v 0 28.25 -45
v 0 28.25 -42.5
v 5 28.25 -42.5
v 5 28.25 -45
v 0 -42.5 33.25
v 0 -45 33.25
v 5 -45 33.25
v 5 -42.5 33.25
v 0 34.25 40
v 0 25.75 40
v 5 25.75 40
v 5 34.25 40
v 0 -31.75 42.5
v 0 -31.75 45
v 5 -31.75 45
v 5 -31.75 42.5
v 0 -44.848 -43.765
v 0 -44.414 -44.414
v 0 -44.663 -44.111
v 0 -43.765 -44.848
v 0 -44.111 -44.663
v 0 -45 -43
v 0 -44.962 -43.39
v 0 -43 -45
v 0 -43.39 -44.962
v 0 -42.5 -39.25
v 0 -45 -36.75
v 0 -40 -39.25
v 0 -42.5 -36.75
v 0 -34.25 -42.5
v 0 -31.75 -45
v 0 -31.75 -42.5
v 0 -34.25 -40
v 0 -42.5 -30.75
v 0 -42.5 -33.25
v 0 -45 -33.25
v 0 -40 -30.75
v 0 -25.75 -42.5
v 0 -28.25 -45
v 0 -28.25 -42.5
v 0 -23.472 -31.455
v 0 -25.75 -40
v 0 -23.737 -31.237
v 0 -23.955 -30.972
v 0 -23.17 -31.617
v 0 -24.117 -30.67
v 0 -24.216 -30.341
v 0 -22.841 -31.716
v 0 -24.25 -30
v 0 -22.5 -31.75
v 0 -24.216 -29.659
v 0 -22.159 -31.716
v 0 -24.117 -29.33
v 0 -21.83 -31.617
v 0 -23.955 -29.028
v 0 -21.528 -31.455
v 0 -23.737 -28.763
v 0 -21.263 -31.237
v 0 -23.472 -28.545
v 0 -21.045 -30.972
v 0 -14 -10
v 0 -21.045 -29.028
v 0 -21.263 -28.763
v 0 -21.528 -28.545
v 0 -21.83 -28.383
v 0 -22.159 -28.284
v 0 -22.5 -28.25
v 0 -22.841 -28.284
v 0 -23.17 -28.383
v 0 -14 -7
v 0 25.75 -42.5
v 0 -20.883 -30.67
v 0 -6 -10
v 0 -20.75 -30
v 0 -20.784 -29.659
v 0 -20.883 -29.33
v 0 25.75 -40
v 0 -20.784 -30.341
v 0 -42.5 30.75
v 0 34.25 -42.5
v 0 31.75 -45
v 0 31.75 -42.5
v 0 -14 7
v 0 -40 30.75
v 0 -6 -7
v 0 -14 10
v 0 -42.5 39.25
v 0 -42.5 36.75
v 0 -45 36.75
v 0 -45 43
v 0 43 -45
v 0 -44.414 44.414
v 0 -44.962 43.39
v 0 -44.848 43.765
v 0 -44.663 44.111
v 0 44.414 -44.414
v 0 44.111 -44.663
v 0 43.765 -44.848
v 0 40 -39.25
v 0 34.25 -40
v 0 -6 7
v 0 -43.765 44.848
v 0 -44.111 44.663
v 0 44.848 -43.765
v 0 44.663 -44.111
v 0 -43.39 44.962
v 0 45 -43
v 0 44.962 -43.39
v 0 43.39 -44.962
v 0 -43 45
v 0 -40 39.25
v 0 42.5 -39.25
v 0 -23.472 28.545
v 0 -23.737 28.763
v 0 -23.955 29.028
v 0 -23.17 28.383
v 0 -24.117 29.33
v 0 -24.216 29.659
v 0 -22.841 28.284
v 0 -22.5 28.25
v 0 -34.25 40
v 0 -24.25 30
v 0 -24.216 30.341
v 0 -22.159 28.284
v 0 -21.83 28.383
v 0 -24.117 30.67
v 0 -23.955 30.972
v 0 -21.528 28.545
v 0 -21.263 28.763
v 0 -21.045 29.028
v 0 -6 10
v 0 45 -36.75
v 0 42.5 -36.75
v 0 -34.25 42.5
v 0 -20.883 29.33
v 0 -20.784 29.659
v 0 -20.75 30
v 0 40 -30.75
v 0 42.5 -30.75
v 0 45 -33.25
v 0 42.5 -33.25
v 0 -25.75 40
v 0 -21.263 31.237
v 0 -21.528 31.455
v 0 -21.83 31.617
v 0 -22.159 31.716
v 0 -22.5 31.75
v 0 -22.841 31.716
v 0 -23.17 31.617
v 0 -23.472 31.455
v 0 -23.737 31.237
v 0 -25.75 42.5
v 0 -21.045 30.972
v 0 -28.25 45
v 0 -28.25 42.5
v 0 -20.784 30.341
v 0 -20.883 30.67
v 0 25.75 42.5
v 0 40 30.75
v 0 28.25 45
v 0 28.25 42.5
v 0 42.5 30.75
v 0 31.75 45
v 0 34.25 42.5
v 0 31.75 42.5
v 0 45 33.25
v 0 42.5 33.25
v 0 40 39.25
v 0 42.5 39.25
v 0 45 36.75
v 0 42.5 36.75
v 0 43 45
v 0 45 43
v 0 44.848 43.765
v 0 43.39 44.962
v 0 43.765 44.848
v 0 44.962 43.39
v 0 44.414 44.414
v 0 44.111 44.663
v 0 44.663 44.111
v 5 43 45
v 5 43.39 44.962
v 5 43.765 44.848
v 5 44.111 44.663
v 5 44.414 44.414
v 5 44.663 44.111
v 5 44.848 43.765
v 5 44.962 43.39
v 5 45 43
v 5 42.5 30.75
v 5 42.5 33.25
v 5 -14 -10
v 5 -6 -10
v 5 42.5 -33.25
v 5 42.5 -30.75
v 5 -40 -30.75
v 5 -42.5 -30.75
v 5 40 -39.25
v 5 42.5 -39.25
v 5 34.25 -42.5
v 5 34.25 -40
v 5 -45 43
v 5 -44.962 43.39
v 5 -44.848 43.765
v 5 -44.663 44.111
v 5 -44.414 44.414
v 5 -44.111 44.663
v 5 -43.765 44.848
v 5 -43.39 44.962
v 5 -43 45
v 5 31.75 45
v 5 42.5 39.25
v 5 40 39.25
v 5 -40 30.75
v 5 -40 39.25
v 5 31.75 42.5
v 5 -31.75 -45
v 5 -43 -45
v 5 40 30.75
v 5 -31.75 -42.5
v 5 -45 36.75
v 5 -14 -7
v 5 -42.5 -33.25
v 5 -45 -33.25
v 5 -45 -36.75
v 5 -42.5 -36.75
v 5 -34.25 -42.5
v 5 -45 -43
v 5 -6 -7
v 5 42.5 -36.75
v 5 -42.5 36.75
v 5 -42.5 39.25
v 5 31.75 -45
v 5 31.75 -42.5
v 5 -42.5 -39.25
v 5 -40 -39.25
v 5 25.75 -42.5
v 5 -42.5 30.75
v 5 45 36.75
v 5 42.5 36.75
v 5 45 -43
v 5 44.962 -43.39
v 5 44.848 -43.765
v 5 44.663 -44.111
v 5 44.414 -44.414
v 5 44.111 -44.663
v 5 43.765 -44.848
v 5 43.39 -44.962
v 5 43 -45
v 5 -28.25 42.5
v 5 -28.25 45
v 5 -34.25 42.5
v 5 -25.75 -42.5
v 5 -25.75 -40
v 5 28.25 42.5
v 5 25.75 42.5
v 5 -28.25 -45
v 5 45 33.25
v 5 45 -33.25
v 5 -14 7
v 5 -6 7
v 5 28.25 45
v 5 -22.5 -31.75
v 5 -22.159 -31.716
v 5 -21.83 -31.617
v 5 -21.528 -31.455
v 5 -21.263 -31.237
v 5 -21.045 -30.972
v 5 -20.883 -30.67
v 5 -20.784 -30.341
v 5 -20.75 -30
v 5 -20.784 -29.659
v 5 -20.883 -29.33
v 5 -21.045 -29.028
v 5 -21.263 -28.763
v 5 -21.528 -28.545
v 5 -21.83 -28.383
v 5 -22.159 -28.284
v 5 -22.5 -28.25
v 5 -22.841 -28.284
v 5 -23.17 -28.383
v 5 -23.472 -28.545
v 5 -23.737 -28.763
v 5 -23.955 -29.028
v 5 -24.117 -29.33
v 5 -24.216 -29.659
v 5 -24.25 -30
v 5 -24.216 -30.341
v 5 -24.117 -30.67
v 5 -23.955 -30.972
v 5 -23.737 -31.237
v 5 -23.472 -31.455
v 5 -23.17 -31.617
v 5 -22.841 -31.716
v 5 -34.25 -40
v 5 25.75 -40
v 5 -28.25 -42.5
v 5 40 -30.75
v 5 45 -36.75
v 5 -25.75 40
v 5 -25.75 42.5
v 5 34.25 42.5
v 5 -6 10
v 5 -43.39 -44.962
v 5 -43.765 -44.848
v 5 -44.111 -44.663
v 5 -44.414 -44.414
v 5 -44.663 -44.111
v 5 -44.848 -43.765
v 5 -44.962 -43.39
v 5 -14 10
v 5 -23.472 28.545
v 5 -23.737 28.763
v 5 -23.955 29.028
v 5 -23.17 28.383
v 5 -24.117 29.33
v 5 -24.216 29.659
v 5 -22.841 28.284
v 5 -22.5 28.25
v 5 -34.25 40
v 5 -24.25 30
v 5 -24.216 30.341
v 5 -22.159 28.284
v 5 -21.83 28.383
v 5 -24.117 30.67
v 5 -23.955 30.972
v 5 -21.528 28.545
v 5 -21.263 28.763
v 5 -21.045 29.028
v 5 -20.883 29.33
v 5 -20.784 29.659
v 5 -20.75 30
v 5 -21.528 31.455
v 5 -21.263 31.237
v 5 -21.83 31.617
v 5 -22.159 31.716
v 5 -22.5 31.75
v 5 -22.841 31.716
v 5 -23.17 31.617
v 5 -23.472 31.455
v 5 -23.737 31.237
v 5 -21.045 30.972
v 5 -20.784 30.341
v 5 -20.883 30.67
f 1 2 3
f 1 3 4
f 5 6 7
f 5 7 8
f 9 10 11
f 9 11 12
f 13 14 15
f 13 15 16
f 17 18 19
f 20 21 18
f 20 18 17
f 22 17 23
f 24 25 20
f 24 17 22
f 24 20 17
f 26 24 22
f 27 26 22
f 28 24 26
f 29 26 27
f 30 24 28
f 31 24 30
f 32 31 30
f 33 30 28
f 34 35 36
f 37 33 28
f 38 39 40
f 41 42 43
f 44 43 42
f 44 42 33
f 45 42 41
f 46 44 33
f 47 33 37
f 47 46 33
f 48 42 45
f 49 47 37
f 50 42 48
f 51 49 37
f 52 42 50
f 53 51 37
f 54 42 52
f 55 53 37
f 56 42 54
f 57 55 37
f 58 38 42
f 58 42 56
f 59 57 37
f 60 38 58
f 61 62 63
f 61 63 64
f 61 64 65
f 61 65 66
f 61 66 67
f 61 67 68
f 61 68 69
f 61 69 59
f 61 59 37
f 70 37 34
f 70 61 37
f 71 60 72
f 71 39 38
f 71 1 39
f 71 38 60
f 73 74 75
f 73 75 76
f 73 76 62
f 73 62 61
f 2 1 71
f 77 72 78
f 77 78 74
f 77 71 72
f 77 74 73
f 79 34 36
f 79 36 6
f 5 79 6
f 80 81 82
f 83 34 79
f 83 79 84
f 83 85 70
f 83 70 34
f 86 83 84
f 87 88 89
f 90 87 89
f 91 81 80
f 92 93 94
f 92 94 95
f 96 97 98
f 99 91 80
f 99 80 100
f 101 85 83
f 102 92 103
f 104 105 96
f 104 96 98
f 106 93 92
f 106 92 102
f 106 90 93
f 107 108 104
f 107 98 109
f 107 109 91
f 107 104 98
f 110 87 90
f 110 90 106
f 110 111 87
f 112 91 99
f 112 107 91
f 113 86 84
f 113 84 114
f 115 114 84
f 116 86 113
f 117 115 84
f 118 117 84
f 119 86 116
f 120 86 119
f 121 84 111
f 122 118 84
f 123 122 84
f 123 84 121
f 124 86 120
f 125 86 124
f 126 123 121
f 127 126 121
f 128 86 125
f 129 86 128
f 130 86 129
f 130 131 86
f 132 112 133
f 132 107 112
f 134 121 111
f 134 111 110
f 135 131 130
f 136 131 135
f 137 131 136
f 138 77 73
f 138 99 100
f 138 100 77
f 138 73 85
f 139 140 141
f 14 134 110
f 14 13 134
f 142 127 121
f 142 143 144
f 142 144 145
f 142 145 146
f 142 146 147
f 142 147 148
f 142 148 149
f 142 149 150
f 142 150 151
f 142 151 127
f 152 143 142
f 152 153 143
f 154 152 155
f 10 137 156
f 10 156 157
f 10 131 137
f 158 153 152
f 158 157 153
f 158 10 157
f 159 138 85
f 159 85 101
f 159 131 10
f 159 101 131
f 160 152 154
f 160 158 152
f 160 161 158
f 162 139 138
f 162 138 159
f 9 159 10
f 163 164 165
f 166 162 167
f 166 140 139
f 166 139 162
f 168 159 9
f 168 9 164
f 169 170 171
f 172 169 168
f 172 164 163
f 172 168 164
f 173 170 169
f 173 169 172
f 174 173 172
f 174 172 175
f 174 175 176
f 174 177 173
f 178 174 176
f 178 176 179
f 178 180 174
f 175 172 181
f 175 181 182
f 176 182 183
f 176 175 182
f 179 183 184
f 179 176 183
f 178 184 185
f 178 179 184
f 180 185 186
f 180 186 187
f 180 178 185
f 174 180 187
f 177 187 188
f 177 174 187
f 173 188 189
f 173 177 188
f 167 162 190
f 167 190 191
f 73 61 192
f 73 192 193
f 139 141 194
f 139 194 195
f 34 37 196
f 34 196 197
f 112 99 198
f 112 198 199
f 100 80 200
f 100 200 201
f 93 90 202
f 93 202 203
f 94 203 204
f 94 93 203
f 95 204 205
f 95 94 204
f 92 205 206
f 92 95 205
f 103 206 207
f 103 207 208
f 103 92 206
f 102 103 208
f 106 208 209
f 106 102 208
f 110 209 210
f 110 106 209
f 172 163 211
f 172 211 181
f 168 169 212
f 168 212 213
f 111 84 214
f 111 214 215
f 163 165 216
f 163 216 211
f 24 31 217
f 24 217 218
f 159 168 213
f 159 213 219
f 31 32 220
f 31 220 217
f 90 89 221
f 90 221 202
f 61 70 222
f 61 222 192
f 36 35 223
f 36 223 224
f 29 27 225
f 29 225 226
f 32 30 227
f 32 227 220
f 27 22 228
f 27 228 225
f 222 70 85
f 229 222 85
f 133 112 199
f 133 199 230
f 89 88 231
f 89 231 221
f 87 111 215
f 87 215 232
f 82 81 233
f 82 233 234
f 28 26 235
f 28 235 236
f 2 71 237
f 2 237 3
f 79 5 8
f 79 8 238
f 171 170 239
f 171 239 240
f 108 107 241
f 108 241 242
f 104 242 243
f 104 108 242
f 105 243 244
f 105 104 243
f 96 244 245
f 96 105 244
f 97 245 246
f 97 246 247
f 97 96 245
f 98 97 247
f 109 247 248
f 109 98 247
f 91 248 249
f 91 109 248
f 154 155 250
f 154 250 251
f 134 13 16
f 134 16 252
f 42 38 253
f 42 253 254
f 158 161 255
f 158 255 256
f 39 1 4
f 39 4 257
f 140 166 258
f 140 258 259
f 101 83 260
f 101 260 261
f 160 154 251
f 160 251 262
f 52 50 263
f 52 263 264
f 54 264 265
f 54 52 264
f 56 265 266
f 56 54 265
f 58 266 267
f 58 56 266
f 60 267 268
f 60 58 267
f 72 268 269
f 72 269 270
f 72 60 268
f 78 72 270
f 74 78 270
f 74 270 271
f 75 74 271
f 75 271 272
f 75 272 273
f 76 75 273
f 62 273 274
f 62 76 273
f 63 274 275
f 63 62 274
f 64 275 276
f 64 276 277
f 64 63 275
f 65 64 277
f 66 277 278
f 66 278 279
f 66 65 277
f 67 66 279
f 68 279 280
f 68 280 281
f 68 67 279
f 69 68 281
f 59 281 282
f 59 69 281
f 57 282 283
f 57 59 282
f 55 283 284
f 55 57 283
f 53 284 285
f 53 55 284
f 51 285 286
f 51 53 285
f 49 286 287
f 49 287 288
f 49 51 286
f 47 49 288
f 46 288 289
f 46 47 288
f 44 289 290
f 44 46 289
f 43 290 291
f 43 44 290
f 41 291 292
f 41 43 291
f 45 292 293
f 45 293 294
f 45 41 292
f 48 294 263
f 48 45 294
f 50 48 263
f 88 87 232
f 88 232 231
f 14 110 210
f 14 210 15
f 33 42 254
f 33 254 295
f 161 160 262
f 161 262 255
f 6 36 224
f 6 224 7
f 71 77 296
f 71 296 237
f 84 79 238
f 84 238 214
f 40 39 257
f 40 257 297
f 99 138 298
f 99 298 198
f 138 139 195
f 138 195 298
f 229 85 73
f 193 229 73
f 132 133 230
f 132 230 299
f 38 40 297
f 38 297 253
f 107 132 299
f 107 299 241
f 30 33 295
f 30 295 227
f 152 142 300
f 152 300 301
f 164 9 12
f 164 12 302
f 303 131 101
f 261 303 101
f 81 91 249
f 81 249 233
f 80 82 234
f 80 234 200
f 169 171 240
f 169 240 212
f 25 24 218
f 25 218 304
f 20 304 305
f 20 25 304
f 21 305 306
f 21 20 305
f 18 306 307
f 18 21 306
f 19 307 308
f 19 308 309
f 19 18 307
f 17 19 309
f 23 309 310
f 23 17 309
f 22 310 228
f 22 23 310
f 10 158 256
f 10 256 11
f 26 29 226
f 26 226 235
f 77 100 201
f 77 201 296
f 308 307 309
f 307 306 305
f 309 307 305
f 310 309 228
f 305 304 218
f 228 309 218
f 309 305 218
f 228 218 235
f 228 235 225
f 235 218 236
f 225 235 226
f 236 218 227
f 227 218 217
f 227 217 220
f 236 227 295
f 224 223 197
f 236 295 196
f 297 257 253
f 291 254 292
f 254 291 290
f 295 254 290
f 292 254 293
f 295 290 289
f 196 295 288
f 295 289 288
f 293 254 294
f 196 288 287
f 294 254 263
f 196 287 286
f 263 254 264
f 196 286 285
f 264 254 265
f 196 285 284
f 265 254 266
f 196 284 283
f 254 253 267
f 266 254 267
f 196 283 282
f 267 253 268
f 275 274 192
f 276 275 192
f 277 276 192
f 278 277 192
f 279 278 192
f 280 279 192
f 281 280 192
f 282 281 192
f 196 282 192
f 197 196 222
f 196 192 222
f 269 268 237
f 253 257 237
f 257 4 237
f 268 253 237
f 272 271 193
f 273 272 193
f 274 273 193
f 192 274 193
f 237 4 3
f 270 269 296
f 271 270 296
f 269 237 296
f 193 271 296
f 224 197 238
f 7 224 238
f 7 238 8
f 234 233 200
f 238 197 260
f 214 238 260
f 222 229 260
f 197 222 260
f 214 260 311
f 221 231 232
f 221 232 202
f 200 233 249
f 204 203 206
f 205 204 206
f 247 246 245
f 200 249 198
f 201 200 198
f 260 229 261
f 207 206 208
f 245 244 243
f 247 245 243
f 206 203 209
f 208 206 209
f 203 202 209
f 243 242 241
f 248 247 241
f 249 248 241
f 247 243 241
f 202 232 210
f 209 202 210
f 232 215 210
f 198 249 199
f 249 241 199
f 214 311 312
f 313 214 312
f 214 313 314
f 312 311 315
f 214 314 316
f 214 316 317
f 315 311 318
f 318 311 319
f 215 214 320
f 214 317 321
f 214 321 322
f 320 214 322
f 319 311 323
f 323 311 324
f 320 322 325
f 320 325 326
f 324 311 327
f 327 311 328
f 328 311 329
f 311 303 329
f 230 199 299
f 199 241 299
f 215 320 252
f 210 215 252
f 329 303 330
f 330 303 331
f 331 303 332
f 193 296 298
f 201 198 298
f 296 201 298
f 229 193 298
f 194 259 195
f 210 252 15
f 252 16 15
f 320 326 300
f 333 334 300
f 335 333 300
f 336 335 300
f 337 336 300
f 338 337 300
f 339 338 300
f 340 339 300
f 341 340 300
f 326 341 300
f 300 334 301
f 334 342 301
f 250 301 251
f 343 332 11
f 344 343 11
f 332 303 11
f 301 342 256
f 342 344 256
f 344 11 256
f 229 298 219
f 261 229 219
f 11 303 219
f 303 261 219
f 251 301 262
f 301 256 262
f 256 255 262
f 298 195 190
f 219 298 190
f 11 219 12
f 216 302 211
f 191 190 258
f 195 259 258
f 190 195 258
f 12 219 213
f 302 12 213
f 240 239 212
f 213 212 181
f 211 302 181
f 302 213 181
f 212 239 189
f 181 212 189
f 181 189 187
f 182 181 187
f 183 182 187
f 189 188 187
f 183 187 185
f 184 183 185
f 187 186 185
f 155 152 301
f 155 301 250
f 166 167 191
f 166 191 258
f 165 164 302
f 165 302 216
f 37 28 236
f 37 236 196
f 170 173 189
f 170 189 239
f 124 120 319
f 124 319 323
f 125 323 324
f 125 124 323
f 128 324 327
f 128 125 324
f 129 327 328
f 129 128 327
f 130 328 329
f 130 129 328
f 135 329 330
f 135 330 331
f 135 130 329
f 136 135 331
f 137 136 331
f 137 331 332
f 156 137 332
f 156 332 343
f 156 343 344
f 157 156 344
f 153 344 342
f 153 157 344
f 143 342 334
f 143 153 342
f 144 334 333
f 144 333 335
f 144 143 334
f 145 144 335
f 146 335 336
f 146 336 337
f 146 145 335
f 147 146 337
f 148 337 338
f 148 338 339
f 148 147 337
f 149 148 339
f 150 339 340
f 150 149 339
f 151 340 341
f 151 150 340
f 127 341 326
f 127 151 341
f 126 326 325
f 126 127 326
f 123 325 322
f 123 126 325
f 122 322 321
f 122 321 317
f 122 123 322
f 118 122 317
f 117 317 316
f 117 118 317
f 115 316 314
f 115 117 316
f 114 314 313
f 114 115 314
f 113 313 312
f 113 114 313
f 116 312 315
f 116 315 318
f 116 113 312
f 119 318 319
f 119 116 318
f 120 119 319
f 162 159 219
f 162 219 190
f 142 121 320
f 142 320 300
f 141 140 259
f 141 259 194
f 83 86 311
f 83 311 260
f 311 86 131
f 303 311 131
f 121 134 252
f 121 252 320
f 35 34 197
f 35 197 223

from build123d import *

# Parameters (mm, degrees)
SKETCH_1_R      = 1.75
SKETCH_1_W      = 3
SKETCH_1_H      = 8
EXTRUDE_1_DEPTH = 5


with BuildPart() as part:
    # Эскиз1 → Бобышка-Вытянуть1 (new body)
    with BuildSketch(Plane(origin=(0, 0, 0), x_dir=(0, 0, -1), z_dir=(1, 0, 0))):
        with BuildLine():
            Line((-36.75, 45), (-36.75, 42.5))
            Line((-36.75, 42.5), (-39.25, 42.5))
            Line((-39.25, 42.5), (-39.25, 40))
            Line((-39.25, 40), (-30.75, 40))
            Line((-30.75, 40), (-30.75, 42.5))
            Line((-30.75, 42.5), (-33.25, 42.5))
            Line((-33.25, 42.5), (-33.25, 45))
            Line((-33.25, 45), (33.25, 45))
            Line((33.25, 45), (33.25, 42.5))
            Line((33.25, 42.5), (30.75, 42.5))
            Line((30.75, 42.5), (30.75, 40))
            Line((30.75, 40), (39.25, 40))
            Line((39.25, 40), (39.25, 42.5))
            Line((39.25, 42.5), (36.75, 42.5))
            Line((36.75, 42.5), (36.75, 45))
            Line((36.75, 45), (43, 45))
            ThreePointArc((43, 45), (44.414213562, 44.414213562), (45, 43))
            Line((45, 43), (45, 31.75))
            Line((45, 31.75), (42.5, 31.75))
            Line((42.5, 31.75), (42.5, 34.25))
            Line((42.5, 34.25), (40, 34.25))
            Line((40, 34.25), (40, 25.75))
            Line((40, 25.75), (42.5, 25.75))
            Line((42.5, 25.75), (42.5, 28.25))
            Line((42.5, 28.25), (45, 28.25))
            Line((45, 28.25), (45, -28.25))
            Line((45, -28.25), (42.5, -28.25))
            Line((42.5, -28.25), (42.5, -25.75))
            Line((42.5, -25.75), (40, -25.75))
            Line((40, -25.75), (40, -34.25))
            Line((40, -34.25), (42.5, -34.25))
            Line((42.5, -34.25), (42.5, -31.75))
            Line((42.5, -31.75), (45, -31.75))
            Line((45, -31.75), (45, -43))
            ThreePointArc((45, -43), (44.414213562, -44.414213562), (43, -45))
            Line((43, -45), (36.75, -45))
            Line((36.75, -45), (36.75, -42.5))
            Line((36.75, -42.5), (39.25, -42.5))
            Line((39.25, -42.5), (39.25, -40))
            Line((39.25, -40), (30.75, -40))
            Line((30.75, -40), (30.75, -42.5))
            Line((30.75, -42.5), (33.25, -42.5))
            Line((33.25, -42.5), (33.25, -45))
            Line((33.25, -45), (-33.25, -45))
            Line((-33.25, -45), (-33.25, -42.5))
            Line((-33.25, -42.5), (-30.75, -42.5))
            Line((-30.75, -42.5), (-30.75, -40))
            Line((-30.75, -40), (-39.25, -40))
            Line((-39.25, -40), (-39.25, -42.5))
            Line((-39.25, -42.5), (-36.75, -42.5))
            Line((-36.75, -42.5), (-36.75, -45))
            Line((-36.75, -45), (-43, -45))
            ThreePointArc((-43, -45), (-44.414213562, -44.414213562), (-45, -43))
            Line((-45, -43), (-45, -31.75))
            Line((-45, -31.75), (-42.5, -31.75))
            Line((-42.5, -31.75), (-42.5, -34.25))
            Line((-42.5, -34.25), (-40, -34.25))
            Line((-40, -34.25), (-40, -25.75))
            Line((-40, -25.75), (-42.5, -25.75))
            Line((-42.5, -25.75), (-42.5, -28.25))
            Line((-42.5, -28.25), (-45, -28.25))
            Line((-45, -28.25), (-45, 28.25))
            Line((-45, 28.25), (-42.5, 28.25))
            Line((-42.5, 28.25), (-42.5, 25.75))
            Line((-42.5, 25.75), (-40, 25.75))
            Line((-40, 25.75), (-40, 34.25))
            Line((-40, 34.25), (-42.5, 34.25))
            Line((-42.5, 34.25), (-42.5, 31.75))
            Line((-42.5, 31.75), (-45, 31.75))
            Line((-45, 31.75), (-45, 43))
            ThreePointArc((-45, 43), (-44.414213562, 44.414213562), (-43, 45))
            Line((-43, 45), (-36.75, 45))
        make_face()
        with Locations((-30, -22.5)):
            Circle(SKETCH_1_R, mode=Mode.SUBTRACT)
        with Locations((30, -22.5)):
            Circle(SKETCH_1_R, mode=Mode.SUBTRACT)
        with Locations((8.5, -10)):
            Rectangle(SKETCH_1_W, SKETCH_1_H, mode=Mode.SUBTRACT)
        with Locations((-8.5, -10)):
            Rectangle(SKETCH_1_W, SKETCH_1_H, mode=Mode.SUBTRACT)
    extrude(amount=EXTRUDE_1_DEPTH)


solid = part.part
